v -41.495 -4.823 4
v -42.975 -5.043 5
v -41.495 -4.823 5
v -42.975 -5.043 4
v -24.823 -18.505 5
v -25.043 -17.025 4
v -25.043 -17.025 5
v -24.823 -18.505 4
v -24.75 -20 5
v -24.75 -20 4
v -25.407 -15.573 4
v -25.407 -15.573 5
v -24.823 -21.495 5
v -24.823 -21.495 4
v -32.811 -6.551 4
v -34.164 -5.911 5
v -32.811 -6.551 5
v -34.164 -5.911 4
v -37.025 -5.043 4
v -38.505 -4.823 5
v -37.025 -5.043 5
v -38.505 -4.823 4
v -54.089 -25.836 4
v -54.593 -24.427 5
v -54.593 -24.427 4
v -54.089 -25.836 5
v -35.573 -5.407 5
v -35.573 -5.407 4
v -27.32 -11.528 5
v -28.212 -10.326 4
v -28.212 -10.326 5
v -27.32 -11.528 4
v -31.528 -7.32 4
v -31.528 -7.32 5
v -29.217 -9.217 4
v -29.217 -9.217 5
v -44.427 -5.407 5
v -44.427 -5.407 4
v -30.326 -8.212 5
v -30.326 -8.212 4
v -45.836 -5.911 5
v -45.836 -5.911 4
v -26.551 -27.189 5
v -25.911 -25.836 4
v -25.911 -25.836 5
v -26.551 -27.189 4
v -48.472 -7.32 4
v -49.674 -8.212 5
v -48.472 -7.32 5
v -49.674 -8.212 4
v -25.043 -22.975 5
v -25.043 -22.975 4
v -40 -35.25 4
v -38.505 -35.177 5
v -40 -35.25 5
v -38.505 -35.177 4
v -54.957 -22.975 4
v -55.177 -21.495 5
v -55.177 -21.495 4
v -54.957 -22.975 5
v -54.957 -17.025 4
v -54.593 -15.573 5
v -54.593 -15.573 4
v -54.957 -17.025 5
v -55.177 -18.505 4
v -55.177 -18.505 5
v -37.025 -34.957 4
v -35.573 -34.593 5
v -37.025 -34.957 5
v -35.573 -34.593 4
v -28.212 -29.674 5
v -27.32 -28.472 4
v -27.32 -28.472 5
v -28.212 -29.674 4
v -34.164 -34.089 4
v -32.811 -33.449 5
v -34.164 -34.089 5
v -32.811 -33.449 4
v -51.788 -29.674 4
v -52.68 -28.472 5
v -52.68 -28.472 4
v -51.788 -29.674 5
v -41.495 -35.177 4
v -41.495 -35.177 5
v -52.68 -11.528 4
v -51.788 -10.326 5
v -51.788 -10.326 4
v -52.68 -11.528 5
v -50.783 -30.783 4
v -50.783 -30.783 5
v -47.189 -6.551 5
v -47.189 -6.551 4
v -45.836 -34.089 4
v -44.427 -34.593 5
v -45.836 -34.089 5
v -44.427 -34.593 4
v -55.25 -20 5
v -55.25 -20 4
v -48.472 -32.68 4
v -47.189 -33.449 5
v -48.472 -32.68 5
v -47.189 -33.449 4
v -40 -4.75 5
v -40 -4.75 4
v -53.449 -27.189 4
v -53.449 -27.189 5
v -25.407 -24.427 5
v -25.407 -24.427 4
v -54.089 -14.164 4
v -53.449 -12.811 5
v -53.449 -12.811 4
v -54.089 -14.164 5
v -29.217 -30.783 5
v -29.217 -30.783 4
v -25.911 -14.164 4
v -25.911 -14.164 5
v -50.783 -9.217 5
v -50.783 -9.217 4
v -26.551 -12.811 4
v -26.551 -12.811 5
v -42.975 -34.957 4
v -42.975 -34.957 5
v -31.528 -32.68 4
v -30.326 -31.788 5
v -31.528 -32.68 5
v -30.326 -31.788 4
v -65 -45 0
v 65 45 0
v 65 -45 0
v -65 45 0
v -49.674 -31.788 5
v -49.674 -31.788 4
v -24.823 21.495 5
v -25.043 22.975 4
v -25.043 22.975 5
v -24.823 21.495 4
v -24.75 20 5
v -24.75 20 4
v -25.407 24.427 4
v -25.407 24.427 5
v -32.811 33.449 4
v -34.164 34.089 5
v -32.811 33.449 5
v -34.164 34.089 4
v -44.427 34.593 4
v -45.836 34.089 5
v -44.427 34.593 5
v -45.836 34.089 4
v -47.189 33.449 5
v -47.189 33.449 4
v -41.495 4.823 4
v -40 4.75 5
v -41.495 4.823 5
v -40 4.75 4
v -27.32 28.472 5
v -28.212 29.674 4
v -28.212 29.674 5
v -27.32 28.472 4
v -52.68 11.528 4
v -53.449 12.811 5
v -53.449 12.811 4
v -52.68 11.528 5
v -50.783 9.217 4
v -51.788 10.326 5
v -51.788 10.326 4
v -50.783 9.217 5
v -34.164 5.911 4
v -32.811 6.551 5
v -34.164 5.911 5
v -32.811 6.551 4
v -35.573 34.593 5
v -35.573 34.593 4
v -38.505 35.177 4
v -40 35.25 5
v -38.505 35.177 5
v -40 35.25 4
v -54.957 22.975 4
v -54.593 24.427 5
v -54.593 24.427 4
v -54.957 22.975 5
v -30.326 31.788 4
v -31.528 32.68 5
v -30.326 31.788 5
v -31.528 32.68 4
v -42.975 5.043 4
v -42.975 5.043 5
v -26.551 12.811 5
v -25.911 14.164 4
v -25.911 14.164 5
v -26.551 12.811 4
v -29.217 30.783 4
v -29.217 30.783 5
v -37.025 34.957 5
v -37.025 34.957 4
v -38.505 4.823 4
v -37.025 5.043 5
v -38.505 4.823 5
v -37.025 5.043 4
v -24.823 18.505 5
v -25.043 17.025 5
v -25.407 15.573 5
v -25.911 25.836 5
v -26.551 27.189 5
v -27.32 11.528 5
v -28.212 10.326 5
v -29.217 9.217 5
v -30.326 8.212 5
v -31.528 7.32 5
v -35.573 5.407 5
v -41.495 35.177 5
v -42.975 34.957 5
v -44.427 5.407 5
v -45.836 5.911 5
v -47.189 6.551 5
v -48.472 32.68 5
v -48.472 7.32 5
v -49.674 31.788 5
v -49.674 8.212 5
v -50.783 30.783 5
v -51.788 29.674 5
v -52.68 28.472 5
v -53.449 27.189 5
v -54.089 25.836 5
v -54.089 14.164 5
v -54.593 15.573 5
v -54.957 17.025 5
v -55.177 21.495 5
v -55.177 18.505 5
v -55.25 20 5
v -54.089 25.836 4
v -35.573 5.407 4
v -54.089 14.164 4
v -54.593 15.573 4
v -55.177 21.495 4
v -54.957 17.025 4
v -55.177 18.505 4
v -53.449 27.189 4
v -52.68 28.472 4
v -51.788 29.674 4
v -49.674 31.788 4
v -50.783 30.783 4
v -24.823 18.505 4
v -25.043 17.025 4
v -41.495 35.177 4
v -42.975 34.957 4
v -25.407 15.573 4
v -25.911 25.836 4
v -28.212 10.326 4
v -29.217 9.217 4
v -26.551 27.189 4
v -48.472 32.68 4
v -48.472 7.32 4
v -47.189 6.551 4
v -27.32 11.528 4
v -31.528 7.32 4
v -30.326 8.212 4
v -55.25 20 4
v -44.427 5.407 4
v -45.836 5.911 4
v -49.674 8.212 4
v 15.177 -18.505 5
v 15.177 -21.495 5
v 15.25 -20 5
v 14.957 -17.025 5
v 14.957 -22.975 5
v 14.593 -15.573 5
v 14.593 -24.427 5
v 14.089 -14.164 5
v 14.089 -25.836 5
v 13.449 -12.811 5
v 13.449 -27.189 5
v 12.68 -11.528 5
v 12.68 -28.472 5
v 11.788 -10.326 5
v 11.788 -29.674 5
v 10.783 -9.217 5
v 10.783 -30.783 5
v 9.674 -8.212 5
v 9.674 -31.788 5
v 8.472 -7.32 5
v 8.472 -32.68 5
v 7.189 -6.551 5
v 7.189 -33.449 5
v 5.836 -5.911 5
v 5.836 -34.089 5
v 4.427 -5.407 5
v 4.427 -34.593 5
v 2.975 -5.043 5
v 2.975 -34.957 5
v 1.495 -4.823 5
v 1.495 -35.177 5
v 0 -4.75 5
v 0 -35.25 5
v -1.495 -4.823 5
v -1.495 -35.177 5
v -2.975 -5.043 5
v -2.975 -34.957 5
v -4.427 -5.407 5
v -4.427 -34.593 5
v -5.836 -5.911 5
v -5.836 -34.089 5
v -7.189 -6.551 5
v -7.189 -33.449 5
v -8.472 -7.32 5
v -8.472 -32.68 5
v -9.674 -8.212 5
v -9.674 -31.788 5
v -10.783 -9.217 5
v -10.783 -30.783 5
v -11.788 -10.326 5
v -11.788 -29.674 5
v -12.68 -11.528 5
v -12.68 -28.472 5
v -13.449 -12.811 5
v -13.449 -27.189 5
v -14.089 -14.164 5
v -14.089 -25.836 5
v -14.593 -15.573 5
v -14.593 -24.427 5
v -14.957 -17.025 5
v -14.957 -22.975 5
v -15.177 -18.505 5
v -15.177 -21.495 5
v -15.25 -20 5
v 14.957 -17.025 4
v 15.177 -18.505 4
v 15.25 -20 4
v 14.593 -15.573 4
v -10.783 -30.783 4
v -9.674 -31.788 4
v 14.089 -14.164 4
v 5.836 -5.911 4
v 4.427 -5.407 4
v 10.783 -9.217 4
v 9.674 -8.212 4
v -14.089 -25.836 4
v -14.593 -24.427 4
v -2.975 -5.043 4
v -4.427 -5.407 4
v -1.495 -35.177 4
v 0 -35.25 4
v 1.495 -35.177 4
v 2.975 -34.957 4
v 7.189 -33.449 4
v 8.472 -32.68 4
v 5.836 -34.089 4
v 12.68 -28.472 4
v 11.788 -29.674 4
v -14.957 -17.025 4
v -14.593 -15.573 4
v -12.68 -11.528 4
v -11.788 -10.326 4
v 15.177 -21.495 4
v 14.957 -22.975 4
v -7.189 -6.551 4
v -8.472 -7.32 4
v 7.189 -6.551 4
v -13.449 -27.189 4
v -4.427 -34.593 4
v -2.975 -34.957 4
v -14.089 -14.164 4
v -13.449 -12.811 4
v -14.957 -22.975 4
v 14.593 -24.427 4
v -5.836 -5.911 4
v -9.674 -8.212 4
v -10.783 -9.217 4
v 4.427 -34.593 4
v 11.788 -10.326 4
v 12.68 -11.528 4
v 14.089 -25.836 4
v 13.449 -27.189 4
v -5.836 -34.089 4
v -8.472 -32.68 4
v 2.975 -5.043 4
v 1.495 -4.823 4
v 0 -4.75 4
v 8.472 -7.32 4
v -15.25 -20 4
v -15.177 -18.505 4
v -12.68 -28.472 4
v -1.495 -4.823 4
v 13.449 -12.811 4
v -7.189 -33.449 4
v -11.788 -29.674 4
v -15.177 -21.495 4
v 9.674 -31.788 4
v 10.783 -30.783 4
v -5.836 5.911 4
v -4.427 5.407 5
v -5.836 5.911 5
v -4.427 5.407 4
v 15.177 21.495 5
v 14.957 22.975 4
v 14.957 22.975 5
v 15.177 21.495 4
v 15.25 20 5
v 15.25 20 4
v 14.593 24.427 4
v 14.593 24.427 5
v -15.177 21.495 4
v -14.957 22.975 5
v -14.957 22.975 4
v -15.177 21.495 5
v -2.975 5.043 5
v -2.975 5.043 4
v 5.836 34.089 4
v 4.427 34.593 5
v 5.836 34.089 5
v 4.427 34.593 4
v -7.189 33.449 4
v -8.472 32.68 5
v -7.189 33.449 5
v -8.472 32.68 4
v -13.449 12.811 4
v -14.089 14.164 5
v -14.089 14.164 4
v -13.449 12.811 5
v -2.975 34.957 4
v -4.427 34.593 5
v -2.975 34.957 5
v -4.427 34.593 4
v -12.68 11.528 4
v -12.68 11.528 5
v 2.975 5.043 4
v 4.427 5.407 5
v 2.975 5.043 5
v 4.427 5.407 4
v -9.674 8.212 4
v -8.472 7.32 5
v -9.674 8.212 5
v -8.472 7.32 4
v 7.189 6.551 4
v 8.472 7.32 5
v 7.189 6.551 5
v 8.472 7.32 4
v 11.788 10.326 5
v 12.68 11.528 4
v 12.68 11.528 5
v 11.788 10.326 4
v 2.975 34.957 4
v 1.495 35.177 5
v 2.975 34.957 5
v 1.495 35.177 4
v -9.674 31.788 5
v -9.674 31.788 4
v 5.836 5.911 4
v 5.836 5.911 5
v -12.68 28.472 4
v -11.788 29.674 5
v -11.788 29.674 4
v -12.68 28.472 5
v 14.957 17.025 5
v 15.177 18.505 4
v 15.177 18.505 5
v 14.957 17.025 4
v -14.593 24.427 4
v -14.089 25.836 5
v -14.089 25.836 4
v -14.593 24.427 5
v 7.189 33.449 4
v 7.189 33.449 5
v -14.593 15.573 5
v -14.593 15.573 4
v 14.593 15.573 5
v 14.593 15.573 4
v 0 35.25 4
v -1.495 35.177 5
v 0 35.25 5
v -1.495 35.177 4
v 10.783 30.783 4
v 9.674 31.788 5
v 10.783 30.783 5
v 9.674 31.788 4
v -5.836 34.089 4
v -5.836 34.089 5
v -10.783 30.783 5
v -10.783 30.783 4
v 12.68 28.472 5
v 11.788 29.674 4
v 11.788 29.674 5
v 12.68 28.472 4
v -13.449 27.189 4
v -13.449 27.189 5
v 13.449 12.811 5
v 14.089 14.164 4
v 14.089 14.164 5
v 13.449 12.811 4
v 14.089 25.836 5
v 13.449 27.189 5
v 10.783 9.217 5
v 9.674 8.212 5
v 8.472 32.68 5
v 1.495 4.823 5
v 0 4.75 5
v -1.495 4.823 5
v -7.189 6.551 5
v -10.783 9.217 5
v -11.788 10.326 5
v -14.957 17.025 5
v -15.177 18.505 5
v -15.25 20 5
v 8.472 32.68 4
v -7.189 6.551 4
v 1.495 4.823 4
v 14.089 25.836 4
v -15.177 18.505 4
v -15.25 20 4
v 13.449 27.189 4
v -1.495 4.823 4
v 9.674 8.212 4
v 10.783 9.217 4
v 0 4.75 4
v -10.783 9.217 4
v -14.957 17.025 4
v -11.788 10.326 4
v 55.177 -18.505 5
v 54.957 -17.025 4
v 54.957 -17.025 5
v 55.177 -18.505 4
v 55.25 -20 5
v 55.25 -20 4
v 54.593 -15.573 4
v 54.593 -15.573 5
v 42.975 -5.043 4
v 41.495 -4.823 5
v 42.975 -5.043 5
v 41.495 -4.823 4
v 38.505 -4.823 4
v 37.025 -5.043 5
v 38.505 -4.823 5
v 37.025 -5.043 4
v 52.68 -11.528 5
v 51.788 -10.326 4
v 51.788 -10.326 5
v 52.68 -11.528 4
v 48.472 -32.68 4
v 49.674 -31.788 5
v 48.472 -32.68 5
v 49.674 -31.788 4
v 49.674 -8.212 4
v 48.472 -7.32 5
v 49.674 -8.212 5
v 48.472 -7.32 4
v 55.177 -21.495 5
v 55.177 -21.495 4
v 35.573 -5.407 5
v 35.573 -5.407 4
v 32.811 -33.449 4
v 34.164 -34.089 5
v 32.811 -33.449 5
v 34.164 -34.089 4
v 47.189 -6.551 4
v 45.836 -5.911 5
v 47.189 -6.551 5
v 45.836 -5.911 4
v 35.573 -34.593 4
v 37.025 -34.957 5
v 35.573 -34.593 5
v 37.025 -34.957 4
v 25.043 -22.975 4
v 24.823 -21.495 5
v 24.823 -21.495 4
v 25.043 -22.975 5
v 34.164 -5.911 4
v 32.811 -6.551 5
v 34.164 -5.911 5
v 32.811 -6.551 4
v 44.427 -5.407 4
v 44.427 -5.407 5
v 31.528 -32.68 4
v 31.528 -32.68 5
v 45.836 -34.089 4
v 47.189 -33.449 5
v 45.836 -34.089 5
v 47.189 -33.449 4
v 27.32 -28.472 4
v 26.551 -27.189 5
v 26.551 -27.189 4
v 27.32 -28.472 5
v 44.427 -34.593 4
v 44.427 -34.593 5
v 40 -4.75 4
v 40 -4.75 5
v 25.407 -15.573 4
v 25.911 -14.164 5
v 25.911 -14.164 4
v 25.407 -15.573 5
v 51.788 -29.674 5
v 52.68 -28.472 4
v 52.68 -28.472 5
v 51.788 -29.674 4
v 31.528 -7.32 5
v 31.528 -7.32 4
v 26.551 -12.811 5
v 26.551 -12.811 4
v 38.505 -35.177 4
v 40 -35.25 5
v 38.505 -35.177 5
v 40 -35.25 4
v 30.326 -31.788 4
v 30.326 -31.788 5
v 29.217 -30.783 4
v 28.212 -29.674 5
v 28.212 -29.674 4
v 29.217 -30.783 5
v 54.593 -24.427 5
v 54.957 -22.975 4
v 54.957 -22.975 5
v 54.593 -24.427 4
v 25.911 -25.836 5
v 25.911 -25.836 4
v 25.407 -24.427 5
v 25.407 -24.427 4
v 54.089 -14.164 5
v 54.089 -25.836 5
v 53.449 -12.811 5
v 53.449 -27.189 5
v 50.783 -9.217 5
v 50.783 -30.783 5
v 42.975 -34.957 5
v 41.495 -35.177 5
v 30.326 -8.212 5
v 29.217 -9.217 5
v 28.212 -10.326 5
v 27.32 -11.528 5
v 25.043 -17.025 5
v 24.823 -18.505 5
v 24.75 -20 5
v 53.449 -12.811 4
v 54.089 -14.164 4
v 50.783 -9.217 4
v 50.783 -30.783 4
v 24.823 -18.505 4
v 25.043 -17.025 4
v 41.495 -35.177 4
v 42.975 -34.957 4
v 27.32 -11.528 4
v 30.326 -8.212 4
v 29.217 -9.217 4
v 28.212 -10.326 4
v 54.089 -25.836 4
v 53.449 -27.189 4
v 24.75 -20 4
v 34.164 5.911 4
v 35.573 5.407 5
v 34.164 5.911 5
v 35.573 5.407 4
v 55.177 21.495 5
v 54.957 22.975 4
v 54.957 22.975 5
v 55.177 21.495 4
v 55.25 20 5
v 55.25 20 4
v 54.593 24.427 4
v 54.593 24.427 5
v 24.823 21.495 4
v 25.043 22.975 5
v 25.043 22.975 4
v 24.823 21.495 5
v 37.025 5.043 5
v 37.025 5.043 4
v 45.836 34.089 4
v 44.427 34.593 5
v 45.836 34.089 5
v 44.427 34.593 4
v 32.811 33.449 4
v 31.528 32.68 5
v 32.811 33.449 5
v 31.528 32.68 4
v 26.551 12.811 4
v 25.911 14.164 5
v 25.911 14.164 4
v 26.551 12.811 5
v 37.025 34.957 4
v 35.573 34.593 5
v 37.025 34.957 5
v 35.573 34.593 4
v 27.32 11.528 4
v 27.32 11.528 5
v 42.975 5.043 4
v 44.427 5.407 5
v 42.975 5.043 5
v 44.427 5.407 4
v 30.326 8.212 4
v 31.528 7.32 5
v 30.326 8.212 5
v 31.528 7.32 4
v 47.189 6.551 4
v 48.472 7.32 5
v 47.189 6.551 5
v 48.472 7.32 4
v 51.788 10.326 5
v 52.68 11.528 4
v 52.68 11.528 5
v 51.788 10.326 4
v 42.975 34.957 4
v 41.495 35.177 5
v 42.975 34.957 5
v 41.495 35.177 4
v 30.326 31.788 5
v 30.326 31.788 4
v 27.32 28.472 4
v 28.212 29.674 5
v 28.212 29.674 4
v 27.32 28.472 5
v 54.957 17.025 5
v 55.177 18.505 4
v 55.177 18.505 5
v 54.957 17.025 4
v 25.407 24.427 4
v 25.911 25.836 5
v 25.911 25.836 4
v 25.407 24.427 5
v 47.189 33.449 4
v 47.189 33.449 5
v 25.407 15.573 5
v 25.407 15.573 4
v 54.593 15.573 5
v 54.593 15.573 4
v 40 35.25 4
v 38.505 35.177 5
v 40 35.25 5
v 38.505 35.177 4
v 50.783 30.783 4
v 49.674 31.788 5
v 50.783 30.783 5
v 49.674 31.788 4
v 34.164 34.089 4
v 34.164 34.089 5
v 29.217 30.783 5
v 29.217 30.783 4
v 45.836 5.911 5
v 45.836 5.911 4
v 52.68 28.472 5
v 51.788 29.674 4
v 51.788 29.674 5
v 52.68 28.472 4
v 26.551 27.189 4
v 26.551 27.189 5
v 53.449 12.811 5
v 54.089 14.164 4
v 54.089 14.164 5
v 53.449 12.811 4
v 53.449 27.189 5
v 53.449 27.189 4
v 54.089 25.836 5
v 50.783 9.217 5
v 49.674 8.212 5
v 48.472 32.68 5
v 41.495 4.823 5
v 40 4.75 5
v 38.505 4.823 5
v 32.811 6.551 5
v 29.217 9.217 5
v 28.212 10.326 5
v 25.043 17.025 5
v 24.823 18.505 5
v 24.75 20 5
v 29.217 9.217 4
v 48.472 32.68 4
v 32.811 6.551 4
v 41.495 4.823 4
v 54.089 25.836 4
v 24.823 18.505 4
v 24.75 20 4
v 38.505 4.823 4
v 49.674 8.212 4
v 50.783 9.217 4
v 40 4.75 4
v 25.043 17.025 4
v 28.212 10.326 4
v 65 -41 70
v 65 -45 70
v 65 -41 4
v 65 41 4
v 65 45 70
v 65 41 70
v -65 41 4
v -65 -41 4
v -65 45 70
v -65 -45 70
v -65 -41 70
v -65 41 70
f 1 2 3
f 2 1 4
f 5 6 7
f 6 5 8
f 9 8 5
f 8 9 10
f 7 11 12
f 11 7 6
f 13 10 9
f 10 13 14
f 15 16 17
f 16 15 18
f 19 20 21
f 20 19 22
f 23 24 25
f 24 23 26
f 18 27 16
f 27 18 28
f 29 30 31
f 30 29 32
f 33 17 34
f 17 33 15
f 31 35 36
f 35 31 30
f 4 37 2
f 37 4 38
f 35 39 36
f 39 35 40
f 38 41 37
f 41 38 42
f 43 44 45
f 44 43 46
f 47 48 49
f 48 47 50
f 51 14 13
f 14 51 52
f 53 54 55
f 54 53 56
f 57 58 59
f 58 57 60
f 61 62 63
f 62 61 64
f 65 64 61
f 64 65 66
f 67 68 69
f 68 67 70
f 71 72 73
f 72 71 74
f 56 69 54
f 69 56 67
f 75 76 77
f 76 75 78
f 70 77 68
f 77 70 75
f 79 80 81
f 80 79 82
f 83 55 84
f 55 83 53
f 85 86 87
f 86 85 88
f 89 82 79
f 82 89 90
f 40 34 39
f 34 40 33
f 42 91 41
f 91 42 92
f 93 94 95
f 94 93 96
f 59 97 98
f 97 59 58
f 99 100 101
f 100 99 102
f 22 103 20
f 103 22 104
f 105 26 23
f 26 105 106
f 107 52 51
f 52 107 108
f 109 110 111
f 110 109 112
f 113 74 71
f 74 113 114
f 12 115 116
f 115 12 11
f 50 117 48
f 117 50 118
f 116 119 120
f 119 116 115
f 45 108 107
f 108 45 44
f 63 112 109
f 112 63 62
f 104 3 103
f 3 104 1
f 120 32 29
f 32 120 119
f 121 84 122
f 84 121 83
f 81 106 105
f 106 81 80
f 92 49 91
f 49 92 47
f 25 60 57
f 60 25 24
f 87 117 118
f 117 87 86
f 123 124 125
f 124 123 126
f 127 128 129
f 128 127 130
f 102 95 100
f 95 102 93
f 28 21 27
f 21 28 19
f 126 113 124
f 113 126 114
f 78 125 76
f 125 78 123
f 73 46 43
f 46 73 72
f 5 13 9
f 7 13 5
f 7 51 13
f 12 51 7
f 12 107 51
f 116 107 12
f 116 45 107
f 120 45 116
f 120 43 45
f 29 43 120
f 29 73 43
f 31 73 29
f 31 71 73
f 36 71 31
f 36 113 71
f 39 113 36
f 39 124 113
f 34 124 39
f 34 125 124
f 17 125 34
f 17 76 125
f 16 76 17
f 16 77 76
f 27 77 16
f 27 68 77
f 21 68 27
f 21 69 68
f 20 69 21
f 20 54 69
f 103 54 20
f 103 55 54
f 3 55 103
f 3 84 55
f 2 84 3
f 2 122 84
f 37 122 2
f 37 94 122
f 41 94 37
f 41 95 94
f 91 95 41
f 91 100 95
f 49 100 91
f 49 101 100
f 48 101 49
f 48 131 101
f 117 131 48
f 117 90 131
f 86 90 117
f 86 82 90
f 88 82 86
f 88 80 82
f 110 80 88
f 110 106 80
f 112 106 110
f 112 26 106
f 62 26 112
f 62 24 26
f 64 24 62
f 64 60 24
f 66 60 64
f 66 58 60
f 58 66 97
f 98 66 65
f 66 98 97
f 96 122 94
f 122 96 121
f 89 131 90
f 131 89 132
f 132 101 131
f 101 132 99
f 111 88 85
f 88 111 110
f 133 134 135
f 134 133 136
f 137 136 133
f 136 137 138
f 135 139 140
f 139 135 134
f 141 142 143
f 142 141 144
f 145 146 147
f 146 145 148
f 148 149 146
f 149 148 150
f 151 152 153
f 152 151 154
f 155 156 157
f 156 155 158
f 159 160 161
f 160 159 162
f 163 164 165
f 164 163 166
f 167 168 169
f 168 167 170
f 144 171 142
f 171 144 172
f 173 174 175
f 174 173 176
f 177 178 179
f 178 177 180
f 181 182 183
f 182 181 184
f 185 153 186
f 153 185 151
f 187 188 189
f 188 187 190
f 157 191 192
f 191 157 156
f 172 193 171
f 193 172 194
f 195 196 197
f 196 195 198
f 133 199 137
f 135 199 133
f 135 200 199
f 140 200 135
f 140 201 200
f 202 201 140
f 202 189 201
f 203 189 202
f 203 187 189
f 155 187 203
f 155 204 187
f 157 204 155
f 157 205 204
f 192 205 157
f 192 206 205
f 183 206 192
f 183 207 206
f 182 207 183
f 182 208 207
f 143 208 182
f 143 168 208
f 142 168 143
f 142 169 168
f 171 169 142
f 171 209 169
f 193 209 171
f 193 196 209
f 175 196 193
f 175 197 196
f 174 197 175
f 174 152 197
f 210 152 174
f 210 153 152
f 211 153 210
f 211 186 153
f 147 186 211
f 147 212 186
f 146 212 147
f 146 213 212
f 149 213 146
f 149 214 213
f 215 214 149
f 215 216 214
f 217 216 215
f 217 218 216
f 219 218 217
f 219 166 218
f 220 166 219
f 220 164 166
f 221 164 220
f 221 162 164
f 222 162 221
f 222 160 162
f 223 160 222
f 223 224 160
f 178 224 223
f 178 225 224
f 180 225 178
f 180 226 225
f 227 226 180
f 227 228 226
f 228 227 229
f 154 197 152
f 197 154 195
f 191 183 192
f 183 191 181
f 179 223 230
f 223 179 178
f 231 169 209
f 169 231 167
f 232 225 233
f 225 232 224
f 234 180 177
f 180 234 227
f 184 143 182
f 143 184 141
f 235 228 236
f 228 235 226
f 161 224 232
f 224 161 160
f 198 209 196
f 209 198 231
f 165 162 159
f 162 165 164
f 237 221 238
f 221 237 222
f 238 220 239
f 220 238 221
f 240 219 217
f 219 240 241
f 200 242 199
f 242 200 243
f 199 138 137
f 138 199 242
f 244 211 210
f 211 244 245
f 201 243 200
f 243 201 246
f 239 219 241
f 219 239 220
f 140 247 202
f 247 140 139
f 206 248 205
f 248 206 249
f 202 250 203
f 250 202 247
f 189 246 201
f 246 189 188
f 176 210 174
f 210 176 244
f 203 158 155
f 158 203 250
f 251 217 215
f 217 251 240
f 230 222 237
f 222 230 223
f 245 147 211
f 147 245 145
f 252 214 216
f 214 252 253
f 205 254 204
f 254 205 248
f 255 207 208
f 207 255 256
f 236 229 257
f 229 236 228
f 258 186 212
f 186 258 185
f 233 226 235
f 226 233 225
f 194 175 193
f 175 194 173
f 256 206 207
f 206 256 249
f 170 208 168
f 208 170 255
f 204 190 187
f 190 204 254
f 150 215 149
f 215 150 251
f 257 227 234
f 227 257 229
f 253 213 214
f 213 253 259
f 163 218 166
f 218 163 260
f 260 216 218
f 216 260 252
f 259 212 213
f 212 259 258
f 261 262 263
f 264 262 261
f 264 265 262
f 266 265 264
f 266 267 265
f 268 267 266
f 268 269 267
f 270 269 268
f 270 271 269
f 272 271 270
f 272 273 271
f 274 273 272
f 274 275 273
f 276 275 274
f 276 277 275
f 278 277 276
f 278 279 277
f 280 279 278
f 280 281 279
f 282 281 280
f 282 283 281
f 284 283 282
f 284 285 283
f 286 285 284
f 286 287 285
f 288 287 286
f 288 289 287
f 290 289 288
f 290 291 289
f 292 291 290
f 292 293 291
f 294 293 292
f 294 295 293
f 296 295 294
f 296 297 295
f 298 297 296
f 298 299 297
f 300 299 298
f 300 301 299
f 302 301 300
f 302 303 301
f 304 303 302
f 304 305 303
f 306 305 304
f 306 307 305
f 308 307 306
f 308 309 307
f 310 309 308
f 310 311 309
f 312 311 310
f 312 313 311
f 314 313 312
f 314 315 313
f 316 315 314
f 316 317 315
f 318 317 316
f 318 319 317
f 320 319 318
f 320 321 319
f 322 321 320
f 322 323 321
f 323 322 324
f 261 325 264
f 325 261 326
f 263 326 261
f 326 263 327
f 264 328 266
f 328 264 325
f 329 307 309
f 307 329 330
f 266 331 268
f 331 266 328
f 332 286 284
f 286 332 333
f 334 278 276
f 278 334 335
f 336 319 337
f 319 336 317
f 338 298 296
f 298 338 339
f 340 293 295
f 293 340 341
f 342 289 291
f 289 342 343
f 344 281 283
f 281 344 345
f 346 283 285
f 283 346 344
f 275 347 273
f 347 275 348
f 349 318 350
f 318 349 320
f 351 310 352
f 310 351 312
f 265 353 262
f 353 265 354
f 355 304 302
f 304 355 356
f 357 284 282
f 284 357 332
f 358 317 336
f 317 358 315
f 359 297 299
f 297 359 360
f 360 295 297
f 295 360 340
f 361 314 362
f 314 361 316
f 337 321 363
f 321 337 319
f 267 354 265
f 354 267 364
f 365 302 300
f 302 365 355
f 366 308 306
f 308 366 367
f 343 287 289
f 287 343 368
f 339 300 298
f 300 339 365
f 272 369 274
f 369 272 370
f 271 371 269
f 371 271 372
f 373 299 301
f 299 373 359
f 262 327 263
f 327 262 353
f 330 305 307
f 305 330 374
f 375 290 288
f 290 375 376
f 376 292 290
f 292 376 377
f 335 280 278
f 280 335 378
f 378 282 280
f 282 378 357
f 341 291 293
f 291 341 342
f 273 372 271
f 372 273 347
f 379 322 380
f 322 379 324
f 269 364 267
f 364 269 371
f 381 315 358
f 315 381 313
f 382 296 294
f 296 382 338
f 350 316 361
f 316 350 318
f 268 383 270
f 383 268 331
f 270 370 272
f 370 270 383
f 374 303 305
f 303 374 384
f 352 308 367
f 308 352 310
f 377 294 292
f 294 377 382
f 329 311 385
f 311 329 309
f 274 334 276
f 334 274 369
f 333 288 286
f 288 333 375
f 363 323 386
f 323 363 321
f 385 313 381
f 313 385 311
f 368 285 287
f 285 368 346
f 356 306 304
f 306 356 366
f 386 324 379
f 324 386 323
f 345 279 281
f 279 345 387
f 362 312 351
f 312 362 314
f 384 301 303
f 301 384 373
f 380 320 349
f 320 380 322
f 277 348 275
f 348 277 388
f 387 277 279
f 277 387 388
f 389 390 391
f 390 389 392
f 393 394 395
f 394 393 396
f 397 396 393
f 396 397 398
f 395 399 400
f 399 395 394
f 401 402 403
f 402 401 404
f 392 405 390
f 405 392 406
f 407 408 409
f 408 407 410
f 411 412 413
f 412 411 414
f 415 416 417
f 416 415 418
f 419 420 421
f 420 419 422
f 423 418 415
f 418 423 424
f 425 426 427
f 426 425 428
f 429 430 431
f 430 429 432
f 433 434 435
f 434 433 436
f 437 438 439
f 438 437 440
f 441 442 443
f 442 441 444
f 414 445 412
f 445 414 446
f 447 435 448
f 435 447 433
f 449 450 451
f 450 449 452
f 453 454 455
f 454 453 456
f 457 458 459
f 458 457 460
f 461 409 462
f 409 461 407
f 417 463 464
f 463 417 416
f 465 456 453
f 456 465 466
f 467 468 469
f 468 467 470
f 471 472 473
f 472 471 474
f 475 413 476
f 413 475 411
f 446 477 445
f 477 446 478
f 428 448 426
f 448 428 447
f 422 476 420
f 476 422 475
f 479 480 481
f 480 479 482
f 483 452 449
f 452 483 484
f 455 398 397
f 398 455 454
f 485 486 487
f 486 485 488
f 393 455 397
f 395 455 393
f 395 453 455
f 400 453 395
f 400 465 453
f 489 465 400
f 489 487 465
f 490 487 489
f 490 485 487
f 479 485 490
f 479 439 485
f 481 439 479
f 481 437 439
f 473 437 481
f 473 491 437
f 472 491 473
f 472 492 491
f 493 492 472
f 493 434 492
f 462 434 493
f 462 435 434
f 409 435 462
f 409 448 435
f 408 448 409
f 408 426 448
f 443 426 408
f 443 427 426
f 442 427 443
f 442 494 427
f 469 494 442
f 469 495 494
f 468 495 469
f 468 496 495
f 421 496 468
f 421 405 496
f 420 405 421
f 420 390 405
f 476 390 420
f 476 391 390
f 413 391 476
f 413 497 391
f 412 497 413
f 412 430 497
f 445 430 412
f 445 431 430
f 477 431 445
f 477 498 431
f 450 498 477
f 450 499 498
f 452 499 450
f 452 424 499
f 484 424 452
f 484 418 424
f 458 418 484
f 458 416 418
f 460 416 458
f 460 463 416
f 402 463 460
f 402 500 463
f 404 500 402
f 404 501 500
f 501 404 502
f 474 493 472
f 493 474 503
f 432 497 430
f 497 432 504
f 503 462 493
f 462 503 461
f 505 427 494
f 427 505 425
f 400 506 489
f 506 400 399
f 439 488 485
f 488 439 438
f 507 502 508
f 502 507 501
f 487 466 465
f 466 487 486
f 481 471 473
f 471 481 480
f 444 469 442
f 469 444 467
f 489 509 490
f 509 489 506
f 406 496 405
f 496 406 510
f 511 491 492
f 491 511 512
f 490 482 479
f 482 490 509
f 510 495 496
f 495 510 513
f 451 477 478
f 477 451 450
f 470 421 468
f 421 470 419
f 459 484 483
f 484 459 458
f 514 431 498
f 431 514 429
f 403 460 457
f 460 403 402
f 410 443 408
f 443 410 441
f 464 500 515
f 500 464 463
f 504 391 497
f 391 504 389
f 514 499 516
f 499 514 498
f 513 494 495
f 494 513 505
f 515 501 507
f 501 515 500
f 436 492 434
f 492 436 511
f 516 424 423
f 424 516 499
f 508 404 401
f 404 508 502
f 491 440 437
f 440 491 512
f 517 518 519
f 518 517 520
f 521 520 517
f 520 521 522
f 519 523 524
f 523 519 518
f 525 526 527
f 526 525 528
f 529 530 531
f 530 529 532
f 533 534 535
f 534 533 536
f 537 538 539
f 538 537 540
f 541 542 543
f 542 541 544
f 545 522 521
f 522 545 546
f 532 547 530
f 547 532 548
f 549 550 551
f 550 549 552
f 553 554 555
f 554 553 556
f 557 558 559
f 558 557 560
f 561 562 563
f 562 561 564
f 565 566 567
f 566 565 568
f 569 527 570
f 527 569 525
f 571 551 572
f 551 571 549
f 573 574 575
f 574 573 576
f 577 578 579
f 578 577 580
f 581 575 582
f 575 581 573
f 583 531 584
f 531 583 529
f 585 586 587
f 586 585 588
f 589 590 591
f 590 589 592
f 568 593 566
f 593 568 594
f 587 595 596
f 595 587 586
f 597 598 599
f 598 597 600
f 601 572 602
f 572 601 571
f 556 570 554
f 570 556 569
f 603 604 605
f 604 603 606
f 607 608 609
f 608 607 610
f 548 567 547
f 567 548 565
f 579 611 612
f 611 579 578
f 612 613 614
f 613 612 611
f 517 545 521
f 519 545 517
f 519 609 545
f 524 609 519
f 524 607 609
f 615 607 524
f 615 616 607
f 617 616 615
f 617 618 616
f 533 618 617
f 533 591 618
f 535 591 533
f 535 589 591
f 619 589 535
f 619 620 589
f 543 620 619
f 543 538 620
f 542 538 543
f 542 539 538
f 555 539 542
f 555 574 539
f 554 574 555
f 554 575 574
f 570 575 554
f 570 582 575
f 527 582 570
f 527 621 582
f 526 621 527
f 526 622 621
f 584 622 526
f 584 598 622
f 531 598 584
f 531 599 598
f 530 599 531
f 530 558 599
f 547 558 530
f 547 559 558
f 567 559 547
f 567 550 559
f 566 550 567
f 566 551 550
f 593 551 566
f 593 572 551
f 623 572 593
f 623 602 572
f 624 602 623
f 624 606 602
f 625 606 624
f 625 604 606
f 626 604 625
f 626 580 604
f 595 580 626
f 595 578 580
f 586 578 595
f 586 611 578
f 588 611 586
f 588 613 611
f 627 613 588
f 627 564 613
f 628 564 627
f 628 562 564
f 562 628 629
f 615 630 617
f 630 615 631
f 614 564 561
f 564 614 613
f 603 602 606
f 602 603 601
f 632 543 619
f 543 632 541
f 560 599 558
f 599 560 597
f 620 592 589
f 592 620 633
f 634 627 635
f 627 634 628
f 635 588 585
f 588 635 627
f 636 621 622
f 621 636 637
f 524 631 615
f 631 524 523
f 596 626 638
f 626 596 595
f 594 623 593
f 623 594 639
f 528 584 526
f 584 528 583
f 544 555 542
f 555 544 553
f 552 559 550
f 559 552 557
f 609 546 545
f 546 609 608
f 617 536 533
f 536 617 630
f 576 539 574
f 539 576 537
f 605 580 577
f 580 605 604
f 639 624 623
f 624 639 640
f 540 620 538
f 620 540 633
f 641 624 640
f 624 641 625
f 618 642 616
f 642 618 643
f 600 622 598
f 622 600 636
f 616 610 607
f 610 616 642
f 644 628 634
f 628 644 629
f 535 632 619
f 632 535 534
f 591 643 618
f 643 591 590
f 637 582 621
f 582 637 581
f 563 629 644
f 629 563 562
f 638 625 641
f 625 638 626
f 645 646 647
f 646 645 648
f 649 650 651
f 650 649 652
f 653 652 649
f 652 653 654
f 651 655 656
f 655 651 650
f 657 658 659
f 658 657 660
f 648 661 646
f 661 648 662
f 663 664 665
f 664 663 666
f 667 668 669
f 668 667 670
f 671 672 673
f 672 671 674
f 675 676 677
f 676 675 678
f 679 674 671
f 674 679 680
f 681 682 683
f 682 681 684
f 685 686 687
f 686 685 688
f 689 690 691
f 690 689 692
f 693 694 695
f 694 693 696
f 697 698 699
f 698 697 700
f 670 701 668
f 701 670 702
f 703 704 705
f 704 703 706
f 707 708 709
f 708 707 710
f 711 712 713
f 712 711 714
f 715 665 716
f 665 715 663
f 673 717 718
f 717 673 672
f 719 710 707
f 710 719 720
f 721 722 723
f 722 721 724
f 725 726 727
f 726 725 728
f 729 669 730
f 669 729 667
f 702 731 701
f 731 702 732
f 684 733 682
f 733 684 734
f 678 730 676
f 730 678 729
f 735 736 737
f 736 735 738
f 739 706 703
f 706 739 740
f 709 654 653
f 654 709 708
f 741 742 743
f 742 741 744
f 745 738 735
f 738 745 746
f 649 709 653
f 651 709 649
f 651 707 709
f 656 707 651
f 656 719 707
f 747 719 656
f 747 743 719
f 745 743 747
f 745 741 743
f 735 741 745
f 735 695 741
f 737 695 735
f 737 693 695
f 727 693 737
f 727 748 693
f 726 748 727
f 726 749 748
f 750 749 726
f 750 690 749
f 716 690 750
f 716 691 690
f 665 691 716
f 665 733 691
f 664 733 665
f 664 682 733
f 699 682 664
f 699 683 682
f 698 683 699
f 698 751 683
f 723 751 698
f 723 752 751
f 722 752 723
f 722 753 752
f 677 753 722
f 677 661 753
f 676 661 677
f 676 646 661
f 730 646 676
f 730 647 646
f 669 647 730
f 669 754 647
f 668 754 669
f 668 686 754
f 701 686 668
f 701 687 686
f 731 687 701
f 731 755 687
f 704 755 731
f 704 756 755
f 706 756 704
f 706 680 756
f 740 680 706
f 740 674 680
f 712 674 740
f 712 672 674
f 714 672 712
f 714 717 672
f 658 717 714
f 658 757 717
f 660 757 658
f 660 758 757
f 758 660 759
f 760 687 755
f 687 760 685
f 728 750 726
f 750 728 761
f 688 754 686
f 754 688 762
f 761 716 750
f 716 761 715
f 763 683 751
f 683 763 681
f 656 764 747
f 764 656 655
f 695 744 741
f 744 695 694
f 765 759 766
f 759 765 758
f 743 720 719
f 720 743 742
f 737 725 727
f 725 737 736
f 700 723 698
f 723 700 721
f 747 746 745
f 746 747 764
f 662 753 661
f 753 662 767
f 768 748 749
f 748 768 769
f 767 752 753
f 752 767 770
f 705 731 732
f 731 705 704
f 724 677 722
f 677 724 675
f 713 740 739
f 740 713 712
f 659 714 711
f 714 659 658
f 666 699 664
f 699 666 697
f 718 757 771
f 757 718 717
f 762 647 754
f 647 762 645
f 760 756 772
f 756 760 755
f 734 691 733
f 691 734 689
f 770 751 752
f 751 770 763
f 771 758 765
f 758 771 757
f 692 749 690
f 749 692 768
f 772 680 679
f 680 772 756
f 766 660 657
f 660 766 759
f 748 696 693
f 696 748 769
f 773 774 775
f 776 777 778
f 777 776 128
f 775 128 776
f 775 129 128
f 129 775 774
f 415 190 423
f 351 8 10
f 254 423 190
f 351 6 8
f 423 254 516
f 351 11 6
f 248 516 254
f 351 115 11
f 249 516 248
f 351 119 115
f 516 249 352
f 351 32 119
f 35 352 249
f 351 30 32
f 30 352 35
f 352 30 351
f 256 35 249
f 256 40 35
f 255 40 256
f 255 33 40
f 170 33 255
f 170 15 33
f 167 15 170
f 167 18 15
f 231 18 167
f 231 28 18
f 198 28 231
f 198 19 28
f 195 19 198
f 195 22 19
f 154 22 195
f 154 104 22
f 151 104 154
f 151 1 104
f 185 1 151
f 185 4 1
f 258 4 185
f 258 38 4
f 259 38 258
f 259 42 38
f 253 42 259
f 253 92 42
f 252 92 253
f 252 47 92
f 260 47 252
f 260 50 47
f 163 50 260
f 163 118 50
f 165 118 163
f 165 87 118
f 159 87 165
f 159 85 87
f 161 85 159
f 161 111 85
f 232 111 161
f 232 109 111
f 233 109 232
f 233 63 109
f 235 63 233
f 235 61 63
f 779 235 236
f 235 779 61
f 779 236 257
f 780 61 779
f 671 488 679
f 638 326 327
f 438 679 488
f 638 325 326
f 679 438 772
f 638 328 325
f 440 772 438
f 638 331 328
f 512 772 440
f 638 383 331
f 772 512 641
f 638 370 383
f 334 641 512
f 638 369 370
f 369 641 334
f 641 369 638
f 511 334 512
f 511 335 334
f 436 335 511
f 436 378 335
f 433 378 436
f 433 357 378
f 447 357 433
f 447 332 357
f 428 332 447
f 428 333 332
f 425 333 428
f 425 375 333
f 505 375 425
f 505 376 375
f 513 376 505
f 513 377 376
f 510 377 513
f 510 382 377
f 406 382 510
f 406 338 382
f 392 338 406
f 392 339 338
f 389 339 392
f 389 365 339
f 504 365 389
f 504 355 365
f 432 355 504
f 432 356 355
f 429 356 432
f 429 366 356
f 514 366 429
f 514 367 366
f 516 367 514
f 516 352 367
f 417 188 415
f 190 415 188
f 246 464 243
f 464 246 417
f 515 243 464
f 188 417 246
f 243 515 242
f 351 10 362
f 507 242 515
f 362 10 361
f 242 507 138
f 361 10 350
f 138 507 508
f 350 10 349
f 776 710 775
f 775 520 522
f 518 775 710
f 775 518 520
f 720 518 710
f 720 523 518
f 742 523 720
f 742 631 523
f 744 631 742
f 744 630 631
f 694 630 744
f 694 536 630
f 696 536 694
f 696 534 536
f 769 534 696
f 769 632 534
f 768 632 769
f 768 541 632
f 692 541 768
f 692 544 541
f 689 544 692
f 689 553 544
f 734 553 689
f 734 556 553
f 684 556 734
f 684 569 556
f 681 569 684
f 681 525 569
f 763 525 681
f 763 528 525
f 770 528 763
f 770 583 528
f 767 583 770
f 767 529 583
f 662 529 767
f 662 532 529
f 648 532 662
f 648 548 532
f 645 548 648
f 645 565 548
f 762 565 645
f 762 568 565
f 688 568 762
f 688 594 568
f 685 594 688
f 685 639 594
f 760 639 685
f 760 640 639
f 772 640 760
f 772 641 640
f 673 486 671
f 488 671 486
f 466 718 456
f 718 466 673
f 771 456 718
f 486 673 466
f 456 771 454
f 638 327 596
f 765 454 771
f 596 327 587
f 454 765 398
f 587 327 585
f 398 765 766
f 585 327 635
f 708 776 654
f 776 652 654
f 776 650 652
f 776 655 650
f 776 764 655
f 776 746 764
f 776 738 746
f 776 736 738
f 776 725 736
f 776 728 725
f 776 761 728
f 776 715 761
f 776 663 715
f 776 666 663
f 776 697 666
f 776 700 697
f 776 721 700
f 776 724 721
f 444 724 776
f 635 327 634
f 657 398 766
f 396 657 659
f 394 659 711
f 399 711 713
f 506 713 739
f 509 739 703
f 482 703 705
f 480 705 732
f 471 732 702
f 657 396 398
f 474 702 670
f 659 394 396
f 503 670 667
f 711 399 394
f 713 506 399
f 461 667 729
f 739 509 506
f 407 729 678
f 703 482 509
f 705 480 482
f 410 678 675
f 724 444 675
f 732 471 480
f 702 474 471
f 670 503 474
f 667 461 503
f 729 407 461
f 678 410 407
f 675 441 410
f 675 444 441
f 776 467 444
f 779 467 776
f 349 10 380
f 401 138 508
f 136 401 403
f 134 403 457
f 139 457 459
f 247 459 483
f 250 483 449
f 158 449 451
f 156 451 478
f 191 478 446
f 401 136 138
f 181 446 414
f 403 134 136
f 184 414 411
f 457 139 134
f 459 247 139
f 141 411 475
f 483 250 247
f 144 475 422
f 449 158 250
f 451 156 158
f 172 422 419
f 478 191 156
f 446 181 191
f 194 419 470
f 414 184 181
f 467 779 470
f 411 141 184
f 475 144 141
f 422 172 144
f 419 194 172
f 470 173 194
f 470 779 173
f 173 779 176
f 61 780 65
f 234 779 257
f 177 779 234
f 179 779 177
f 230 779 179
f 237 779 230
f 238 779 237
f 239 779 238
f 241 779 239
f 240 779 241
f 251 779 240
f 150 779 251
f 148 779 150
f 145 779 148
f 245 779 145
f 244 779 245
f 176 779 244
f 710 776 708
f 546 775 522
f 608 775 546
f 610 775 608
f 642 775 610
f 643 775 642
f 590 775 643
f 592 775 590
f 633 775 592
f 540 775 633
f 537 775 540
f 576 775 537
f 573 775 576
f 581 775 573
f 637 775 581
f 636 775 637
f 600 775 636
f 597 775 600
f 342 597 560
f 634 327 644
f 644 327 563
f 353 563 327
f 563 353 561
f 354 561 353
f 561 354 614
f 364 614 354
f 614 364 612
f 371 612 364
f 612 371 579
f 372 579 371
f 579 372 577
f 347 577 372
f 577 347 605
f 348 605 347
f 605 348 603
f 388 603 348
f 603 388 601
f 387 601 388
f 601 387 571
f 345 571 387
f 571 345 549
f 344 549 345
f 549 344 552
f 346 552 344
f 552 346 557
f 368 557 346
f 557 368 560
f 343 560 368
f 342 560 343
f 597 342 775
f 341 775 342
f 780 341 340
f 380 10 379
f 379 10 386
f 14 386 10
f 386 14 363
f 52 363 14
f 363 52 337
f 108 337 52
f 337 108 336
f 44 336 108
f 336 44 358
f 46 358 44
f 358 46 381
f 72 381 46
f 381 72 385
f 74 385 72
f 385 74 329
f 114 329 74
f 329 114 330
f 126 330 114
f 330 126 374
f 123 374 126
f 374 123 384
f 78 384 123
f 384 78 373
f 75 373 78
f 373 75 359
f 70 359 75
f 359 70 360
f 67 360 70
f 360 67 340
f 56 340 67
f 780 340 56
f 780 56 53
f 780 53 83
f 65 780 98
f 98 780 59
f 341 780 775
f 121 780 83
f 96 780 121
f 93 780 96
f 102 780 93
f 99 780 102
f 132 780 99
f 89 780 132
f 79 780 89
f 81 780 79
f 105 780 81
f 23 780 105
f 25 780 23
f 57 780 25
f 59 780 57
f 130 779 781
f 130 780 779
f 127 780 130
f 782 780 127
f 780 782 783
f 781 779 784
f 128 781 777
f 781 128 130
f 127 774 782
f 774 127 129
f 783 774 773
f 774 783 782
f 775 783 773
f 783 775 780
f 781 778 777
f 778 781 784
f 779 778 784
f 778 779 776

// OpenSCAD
// Rack for six 50 mL conical tubes.
// Print orientation: Flat plate on bed (z=0), walls rising to z=70.
// After printing, flip over so walls stand on the bed and tubes hang down.

// Plate dimensions
L     = 130; // Length (X)
W     = 90;  // Width (Y)
t     = 4;   // Plate thickness (Z)

// Hole dimensions and layout
n_rows = 2; // Rows along Y
n_cols = 3; // Columns along X
hole_d = 30.5; // Hole diameter
c_x    = 40;   // Centre-to-centre spacing X
c_y    = 40;   // Centre-to-centre spacing Y

// Wall dimensions
wall_top_z = 70; // Target Z coordinate for the top of the walls
wall_t = 4;  // Wall thickness (Y)

// Derived positions
// X positions: -40, 0, 40 (3 cols, spacing 40, centered)
// Y positions: -20, 20 (2 rows, spacing 40, centered)

$fn = 64;

module rack() {
    // 1. The Base Plate
    // Flat plate 130x90x4, centered on origin, sitting on z=0.
    translate([-L/2, -W/2, 0]) cube([L, W, t]);

    // 2. The Through-Holes
    // 6 holes, 30.5mm diameter.
    // Grid: 3 columns (X), 2 rows (Y).
    // Spacing: 40mm in both directions.
    // X coords: -40, 0, 40
    // Y coords: -20, 20
    
    for (i = [-1, 0, 1]) {
        for (j = [-1, 0]) {
            // Calculate X and Y based on loop indices
            // i: -1, 0, 1 -> X: -40, 0, 40
            // j: -1, 0   -> Y: -20, 20
            x_pos = i * 40;
            y_pos = (j + 0.5) * 40; // -0.5*40 = -20, 0.5*40 = 20
            
            translate([x_pos, y_pos, 0]) {
                cylinder(h = t + 1, d = hole_d); // Extend slightly past plate
            }
        }
    }

    // 3. The Side Walls
    // Two walls along the long edges (X axis).
    // Length 130 (X), Thickness 4 (Y).
    // Rise from plate top (z=4) to z=70. Total height from bed = 70.
    // They are flush with the plate's long edge.
    // Plate Y range: -45 to 45.
    // Left wall: at Y = -45.
    // Right wall: at Y = 45.
    
    // Left Wall
    translate([-L/2, -W/2, 0]) cube([L, wall_t, wall_top_z]);
    
    // Right Wall
    translate([-L/2, W/2 - wall_t, 0]) cube([L, wall_t, wall_top_z]);
}

rack();
